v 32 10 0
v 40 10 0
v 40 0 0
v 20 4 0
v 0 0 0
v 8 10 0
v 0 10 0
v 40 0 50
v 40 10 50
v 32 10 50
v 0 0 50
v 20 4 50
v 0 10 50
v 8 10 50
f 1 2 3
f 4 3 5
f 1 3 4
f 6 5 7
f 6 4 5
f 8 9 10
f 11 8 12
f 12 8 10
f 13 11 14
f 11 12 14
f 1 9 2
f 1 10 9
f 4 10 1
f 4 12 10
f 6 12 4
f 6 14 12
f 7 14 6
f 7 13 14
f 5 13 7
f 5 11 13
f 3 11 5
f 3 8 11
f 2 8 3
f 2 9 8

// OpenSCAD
$fn = 32;

// ----------------------------------------------------------------------
// V guide rail: vway, 40 mm wide
// ----------------------------------------------------------------------

// --- parameters (mm) ---
rail_w = 40;              // rail width, X
base_t = 10;              // base plate thickness
v_depth = 6;              // V feature depth / height
v_half_w = 12;            // half width of the V at the base face
plate_t = 50;             // rail length, Z (the extrusion height)

profile = [[0, 0], [40, 0], [40, 10], [32, 10], [20, 4], [8, 10], [0, 10]];  // primary outline, 7 points, counter clockwise

// --- the one profile operation ---
linear_extrude(height = plate_t) polygon(points = profile);
